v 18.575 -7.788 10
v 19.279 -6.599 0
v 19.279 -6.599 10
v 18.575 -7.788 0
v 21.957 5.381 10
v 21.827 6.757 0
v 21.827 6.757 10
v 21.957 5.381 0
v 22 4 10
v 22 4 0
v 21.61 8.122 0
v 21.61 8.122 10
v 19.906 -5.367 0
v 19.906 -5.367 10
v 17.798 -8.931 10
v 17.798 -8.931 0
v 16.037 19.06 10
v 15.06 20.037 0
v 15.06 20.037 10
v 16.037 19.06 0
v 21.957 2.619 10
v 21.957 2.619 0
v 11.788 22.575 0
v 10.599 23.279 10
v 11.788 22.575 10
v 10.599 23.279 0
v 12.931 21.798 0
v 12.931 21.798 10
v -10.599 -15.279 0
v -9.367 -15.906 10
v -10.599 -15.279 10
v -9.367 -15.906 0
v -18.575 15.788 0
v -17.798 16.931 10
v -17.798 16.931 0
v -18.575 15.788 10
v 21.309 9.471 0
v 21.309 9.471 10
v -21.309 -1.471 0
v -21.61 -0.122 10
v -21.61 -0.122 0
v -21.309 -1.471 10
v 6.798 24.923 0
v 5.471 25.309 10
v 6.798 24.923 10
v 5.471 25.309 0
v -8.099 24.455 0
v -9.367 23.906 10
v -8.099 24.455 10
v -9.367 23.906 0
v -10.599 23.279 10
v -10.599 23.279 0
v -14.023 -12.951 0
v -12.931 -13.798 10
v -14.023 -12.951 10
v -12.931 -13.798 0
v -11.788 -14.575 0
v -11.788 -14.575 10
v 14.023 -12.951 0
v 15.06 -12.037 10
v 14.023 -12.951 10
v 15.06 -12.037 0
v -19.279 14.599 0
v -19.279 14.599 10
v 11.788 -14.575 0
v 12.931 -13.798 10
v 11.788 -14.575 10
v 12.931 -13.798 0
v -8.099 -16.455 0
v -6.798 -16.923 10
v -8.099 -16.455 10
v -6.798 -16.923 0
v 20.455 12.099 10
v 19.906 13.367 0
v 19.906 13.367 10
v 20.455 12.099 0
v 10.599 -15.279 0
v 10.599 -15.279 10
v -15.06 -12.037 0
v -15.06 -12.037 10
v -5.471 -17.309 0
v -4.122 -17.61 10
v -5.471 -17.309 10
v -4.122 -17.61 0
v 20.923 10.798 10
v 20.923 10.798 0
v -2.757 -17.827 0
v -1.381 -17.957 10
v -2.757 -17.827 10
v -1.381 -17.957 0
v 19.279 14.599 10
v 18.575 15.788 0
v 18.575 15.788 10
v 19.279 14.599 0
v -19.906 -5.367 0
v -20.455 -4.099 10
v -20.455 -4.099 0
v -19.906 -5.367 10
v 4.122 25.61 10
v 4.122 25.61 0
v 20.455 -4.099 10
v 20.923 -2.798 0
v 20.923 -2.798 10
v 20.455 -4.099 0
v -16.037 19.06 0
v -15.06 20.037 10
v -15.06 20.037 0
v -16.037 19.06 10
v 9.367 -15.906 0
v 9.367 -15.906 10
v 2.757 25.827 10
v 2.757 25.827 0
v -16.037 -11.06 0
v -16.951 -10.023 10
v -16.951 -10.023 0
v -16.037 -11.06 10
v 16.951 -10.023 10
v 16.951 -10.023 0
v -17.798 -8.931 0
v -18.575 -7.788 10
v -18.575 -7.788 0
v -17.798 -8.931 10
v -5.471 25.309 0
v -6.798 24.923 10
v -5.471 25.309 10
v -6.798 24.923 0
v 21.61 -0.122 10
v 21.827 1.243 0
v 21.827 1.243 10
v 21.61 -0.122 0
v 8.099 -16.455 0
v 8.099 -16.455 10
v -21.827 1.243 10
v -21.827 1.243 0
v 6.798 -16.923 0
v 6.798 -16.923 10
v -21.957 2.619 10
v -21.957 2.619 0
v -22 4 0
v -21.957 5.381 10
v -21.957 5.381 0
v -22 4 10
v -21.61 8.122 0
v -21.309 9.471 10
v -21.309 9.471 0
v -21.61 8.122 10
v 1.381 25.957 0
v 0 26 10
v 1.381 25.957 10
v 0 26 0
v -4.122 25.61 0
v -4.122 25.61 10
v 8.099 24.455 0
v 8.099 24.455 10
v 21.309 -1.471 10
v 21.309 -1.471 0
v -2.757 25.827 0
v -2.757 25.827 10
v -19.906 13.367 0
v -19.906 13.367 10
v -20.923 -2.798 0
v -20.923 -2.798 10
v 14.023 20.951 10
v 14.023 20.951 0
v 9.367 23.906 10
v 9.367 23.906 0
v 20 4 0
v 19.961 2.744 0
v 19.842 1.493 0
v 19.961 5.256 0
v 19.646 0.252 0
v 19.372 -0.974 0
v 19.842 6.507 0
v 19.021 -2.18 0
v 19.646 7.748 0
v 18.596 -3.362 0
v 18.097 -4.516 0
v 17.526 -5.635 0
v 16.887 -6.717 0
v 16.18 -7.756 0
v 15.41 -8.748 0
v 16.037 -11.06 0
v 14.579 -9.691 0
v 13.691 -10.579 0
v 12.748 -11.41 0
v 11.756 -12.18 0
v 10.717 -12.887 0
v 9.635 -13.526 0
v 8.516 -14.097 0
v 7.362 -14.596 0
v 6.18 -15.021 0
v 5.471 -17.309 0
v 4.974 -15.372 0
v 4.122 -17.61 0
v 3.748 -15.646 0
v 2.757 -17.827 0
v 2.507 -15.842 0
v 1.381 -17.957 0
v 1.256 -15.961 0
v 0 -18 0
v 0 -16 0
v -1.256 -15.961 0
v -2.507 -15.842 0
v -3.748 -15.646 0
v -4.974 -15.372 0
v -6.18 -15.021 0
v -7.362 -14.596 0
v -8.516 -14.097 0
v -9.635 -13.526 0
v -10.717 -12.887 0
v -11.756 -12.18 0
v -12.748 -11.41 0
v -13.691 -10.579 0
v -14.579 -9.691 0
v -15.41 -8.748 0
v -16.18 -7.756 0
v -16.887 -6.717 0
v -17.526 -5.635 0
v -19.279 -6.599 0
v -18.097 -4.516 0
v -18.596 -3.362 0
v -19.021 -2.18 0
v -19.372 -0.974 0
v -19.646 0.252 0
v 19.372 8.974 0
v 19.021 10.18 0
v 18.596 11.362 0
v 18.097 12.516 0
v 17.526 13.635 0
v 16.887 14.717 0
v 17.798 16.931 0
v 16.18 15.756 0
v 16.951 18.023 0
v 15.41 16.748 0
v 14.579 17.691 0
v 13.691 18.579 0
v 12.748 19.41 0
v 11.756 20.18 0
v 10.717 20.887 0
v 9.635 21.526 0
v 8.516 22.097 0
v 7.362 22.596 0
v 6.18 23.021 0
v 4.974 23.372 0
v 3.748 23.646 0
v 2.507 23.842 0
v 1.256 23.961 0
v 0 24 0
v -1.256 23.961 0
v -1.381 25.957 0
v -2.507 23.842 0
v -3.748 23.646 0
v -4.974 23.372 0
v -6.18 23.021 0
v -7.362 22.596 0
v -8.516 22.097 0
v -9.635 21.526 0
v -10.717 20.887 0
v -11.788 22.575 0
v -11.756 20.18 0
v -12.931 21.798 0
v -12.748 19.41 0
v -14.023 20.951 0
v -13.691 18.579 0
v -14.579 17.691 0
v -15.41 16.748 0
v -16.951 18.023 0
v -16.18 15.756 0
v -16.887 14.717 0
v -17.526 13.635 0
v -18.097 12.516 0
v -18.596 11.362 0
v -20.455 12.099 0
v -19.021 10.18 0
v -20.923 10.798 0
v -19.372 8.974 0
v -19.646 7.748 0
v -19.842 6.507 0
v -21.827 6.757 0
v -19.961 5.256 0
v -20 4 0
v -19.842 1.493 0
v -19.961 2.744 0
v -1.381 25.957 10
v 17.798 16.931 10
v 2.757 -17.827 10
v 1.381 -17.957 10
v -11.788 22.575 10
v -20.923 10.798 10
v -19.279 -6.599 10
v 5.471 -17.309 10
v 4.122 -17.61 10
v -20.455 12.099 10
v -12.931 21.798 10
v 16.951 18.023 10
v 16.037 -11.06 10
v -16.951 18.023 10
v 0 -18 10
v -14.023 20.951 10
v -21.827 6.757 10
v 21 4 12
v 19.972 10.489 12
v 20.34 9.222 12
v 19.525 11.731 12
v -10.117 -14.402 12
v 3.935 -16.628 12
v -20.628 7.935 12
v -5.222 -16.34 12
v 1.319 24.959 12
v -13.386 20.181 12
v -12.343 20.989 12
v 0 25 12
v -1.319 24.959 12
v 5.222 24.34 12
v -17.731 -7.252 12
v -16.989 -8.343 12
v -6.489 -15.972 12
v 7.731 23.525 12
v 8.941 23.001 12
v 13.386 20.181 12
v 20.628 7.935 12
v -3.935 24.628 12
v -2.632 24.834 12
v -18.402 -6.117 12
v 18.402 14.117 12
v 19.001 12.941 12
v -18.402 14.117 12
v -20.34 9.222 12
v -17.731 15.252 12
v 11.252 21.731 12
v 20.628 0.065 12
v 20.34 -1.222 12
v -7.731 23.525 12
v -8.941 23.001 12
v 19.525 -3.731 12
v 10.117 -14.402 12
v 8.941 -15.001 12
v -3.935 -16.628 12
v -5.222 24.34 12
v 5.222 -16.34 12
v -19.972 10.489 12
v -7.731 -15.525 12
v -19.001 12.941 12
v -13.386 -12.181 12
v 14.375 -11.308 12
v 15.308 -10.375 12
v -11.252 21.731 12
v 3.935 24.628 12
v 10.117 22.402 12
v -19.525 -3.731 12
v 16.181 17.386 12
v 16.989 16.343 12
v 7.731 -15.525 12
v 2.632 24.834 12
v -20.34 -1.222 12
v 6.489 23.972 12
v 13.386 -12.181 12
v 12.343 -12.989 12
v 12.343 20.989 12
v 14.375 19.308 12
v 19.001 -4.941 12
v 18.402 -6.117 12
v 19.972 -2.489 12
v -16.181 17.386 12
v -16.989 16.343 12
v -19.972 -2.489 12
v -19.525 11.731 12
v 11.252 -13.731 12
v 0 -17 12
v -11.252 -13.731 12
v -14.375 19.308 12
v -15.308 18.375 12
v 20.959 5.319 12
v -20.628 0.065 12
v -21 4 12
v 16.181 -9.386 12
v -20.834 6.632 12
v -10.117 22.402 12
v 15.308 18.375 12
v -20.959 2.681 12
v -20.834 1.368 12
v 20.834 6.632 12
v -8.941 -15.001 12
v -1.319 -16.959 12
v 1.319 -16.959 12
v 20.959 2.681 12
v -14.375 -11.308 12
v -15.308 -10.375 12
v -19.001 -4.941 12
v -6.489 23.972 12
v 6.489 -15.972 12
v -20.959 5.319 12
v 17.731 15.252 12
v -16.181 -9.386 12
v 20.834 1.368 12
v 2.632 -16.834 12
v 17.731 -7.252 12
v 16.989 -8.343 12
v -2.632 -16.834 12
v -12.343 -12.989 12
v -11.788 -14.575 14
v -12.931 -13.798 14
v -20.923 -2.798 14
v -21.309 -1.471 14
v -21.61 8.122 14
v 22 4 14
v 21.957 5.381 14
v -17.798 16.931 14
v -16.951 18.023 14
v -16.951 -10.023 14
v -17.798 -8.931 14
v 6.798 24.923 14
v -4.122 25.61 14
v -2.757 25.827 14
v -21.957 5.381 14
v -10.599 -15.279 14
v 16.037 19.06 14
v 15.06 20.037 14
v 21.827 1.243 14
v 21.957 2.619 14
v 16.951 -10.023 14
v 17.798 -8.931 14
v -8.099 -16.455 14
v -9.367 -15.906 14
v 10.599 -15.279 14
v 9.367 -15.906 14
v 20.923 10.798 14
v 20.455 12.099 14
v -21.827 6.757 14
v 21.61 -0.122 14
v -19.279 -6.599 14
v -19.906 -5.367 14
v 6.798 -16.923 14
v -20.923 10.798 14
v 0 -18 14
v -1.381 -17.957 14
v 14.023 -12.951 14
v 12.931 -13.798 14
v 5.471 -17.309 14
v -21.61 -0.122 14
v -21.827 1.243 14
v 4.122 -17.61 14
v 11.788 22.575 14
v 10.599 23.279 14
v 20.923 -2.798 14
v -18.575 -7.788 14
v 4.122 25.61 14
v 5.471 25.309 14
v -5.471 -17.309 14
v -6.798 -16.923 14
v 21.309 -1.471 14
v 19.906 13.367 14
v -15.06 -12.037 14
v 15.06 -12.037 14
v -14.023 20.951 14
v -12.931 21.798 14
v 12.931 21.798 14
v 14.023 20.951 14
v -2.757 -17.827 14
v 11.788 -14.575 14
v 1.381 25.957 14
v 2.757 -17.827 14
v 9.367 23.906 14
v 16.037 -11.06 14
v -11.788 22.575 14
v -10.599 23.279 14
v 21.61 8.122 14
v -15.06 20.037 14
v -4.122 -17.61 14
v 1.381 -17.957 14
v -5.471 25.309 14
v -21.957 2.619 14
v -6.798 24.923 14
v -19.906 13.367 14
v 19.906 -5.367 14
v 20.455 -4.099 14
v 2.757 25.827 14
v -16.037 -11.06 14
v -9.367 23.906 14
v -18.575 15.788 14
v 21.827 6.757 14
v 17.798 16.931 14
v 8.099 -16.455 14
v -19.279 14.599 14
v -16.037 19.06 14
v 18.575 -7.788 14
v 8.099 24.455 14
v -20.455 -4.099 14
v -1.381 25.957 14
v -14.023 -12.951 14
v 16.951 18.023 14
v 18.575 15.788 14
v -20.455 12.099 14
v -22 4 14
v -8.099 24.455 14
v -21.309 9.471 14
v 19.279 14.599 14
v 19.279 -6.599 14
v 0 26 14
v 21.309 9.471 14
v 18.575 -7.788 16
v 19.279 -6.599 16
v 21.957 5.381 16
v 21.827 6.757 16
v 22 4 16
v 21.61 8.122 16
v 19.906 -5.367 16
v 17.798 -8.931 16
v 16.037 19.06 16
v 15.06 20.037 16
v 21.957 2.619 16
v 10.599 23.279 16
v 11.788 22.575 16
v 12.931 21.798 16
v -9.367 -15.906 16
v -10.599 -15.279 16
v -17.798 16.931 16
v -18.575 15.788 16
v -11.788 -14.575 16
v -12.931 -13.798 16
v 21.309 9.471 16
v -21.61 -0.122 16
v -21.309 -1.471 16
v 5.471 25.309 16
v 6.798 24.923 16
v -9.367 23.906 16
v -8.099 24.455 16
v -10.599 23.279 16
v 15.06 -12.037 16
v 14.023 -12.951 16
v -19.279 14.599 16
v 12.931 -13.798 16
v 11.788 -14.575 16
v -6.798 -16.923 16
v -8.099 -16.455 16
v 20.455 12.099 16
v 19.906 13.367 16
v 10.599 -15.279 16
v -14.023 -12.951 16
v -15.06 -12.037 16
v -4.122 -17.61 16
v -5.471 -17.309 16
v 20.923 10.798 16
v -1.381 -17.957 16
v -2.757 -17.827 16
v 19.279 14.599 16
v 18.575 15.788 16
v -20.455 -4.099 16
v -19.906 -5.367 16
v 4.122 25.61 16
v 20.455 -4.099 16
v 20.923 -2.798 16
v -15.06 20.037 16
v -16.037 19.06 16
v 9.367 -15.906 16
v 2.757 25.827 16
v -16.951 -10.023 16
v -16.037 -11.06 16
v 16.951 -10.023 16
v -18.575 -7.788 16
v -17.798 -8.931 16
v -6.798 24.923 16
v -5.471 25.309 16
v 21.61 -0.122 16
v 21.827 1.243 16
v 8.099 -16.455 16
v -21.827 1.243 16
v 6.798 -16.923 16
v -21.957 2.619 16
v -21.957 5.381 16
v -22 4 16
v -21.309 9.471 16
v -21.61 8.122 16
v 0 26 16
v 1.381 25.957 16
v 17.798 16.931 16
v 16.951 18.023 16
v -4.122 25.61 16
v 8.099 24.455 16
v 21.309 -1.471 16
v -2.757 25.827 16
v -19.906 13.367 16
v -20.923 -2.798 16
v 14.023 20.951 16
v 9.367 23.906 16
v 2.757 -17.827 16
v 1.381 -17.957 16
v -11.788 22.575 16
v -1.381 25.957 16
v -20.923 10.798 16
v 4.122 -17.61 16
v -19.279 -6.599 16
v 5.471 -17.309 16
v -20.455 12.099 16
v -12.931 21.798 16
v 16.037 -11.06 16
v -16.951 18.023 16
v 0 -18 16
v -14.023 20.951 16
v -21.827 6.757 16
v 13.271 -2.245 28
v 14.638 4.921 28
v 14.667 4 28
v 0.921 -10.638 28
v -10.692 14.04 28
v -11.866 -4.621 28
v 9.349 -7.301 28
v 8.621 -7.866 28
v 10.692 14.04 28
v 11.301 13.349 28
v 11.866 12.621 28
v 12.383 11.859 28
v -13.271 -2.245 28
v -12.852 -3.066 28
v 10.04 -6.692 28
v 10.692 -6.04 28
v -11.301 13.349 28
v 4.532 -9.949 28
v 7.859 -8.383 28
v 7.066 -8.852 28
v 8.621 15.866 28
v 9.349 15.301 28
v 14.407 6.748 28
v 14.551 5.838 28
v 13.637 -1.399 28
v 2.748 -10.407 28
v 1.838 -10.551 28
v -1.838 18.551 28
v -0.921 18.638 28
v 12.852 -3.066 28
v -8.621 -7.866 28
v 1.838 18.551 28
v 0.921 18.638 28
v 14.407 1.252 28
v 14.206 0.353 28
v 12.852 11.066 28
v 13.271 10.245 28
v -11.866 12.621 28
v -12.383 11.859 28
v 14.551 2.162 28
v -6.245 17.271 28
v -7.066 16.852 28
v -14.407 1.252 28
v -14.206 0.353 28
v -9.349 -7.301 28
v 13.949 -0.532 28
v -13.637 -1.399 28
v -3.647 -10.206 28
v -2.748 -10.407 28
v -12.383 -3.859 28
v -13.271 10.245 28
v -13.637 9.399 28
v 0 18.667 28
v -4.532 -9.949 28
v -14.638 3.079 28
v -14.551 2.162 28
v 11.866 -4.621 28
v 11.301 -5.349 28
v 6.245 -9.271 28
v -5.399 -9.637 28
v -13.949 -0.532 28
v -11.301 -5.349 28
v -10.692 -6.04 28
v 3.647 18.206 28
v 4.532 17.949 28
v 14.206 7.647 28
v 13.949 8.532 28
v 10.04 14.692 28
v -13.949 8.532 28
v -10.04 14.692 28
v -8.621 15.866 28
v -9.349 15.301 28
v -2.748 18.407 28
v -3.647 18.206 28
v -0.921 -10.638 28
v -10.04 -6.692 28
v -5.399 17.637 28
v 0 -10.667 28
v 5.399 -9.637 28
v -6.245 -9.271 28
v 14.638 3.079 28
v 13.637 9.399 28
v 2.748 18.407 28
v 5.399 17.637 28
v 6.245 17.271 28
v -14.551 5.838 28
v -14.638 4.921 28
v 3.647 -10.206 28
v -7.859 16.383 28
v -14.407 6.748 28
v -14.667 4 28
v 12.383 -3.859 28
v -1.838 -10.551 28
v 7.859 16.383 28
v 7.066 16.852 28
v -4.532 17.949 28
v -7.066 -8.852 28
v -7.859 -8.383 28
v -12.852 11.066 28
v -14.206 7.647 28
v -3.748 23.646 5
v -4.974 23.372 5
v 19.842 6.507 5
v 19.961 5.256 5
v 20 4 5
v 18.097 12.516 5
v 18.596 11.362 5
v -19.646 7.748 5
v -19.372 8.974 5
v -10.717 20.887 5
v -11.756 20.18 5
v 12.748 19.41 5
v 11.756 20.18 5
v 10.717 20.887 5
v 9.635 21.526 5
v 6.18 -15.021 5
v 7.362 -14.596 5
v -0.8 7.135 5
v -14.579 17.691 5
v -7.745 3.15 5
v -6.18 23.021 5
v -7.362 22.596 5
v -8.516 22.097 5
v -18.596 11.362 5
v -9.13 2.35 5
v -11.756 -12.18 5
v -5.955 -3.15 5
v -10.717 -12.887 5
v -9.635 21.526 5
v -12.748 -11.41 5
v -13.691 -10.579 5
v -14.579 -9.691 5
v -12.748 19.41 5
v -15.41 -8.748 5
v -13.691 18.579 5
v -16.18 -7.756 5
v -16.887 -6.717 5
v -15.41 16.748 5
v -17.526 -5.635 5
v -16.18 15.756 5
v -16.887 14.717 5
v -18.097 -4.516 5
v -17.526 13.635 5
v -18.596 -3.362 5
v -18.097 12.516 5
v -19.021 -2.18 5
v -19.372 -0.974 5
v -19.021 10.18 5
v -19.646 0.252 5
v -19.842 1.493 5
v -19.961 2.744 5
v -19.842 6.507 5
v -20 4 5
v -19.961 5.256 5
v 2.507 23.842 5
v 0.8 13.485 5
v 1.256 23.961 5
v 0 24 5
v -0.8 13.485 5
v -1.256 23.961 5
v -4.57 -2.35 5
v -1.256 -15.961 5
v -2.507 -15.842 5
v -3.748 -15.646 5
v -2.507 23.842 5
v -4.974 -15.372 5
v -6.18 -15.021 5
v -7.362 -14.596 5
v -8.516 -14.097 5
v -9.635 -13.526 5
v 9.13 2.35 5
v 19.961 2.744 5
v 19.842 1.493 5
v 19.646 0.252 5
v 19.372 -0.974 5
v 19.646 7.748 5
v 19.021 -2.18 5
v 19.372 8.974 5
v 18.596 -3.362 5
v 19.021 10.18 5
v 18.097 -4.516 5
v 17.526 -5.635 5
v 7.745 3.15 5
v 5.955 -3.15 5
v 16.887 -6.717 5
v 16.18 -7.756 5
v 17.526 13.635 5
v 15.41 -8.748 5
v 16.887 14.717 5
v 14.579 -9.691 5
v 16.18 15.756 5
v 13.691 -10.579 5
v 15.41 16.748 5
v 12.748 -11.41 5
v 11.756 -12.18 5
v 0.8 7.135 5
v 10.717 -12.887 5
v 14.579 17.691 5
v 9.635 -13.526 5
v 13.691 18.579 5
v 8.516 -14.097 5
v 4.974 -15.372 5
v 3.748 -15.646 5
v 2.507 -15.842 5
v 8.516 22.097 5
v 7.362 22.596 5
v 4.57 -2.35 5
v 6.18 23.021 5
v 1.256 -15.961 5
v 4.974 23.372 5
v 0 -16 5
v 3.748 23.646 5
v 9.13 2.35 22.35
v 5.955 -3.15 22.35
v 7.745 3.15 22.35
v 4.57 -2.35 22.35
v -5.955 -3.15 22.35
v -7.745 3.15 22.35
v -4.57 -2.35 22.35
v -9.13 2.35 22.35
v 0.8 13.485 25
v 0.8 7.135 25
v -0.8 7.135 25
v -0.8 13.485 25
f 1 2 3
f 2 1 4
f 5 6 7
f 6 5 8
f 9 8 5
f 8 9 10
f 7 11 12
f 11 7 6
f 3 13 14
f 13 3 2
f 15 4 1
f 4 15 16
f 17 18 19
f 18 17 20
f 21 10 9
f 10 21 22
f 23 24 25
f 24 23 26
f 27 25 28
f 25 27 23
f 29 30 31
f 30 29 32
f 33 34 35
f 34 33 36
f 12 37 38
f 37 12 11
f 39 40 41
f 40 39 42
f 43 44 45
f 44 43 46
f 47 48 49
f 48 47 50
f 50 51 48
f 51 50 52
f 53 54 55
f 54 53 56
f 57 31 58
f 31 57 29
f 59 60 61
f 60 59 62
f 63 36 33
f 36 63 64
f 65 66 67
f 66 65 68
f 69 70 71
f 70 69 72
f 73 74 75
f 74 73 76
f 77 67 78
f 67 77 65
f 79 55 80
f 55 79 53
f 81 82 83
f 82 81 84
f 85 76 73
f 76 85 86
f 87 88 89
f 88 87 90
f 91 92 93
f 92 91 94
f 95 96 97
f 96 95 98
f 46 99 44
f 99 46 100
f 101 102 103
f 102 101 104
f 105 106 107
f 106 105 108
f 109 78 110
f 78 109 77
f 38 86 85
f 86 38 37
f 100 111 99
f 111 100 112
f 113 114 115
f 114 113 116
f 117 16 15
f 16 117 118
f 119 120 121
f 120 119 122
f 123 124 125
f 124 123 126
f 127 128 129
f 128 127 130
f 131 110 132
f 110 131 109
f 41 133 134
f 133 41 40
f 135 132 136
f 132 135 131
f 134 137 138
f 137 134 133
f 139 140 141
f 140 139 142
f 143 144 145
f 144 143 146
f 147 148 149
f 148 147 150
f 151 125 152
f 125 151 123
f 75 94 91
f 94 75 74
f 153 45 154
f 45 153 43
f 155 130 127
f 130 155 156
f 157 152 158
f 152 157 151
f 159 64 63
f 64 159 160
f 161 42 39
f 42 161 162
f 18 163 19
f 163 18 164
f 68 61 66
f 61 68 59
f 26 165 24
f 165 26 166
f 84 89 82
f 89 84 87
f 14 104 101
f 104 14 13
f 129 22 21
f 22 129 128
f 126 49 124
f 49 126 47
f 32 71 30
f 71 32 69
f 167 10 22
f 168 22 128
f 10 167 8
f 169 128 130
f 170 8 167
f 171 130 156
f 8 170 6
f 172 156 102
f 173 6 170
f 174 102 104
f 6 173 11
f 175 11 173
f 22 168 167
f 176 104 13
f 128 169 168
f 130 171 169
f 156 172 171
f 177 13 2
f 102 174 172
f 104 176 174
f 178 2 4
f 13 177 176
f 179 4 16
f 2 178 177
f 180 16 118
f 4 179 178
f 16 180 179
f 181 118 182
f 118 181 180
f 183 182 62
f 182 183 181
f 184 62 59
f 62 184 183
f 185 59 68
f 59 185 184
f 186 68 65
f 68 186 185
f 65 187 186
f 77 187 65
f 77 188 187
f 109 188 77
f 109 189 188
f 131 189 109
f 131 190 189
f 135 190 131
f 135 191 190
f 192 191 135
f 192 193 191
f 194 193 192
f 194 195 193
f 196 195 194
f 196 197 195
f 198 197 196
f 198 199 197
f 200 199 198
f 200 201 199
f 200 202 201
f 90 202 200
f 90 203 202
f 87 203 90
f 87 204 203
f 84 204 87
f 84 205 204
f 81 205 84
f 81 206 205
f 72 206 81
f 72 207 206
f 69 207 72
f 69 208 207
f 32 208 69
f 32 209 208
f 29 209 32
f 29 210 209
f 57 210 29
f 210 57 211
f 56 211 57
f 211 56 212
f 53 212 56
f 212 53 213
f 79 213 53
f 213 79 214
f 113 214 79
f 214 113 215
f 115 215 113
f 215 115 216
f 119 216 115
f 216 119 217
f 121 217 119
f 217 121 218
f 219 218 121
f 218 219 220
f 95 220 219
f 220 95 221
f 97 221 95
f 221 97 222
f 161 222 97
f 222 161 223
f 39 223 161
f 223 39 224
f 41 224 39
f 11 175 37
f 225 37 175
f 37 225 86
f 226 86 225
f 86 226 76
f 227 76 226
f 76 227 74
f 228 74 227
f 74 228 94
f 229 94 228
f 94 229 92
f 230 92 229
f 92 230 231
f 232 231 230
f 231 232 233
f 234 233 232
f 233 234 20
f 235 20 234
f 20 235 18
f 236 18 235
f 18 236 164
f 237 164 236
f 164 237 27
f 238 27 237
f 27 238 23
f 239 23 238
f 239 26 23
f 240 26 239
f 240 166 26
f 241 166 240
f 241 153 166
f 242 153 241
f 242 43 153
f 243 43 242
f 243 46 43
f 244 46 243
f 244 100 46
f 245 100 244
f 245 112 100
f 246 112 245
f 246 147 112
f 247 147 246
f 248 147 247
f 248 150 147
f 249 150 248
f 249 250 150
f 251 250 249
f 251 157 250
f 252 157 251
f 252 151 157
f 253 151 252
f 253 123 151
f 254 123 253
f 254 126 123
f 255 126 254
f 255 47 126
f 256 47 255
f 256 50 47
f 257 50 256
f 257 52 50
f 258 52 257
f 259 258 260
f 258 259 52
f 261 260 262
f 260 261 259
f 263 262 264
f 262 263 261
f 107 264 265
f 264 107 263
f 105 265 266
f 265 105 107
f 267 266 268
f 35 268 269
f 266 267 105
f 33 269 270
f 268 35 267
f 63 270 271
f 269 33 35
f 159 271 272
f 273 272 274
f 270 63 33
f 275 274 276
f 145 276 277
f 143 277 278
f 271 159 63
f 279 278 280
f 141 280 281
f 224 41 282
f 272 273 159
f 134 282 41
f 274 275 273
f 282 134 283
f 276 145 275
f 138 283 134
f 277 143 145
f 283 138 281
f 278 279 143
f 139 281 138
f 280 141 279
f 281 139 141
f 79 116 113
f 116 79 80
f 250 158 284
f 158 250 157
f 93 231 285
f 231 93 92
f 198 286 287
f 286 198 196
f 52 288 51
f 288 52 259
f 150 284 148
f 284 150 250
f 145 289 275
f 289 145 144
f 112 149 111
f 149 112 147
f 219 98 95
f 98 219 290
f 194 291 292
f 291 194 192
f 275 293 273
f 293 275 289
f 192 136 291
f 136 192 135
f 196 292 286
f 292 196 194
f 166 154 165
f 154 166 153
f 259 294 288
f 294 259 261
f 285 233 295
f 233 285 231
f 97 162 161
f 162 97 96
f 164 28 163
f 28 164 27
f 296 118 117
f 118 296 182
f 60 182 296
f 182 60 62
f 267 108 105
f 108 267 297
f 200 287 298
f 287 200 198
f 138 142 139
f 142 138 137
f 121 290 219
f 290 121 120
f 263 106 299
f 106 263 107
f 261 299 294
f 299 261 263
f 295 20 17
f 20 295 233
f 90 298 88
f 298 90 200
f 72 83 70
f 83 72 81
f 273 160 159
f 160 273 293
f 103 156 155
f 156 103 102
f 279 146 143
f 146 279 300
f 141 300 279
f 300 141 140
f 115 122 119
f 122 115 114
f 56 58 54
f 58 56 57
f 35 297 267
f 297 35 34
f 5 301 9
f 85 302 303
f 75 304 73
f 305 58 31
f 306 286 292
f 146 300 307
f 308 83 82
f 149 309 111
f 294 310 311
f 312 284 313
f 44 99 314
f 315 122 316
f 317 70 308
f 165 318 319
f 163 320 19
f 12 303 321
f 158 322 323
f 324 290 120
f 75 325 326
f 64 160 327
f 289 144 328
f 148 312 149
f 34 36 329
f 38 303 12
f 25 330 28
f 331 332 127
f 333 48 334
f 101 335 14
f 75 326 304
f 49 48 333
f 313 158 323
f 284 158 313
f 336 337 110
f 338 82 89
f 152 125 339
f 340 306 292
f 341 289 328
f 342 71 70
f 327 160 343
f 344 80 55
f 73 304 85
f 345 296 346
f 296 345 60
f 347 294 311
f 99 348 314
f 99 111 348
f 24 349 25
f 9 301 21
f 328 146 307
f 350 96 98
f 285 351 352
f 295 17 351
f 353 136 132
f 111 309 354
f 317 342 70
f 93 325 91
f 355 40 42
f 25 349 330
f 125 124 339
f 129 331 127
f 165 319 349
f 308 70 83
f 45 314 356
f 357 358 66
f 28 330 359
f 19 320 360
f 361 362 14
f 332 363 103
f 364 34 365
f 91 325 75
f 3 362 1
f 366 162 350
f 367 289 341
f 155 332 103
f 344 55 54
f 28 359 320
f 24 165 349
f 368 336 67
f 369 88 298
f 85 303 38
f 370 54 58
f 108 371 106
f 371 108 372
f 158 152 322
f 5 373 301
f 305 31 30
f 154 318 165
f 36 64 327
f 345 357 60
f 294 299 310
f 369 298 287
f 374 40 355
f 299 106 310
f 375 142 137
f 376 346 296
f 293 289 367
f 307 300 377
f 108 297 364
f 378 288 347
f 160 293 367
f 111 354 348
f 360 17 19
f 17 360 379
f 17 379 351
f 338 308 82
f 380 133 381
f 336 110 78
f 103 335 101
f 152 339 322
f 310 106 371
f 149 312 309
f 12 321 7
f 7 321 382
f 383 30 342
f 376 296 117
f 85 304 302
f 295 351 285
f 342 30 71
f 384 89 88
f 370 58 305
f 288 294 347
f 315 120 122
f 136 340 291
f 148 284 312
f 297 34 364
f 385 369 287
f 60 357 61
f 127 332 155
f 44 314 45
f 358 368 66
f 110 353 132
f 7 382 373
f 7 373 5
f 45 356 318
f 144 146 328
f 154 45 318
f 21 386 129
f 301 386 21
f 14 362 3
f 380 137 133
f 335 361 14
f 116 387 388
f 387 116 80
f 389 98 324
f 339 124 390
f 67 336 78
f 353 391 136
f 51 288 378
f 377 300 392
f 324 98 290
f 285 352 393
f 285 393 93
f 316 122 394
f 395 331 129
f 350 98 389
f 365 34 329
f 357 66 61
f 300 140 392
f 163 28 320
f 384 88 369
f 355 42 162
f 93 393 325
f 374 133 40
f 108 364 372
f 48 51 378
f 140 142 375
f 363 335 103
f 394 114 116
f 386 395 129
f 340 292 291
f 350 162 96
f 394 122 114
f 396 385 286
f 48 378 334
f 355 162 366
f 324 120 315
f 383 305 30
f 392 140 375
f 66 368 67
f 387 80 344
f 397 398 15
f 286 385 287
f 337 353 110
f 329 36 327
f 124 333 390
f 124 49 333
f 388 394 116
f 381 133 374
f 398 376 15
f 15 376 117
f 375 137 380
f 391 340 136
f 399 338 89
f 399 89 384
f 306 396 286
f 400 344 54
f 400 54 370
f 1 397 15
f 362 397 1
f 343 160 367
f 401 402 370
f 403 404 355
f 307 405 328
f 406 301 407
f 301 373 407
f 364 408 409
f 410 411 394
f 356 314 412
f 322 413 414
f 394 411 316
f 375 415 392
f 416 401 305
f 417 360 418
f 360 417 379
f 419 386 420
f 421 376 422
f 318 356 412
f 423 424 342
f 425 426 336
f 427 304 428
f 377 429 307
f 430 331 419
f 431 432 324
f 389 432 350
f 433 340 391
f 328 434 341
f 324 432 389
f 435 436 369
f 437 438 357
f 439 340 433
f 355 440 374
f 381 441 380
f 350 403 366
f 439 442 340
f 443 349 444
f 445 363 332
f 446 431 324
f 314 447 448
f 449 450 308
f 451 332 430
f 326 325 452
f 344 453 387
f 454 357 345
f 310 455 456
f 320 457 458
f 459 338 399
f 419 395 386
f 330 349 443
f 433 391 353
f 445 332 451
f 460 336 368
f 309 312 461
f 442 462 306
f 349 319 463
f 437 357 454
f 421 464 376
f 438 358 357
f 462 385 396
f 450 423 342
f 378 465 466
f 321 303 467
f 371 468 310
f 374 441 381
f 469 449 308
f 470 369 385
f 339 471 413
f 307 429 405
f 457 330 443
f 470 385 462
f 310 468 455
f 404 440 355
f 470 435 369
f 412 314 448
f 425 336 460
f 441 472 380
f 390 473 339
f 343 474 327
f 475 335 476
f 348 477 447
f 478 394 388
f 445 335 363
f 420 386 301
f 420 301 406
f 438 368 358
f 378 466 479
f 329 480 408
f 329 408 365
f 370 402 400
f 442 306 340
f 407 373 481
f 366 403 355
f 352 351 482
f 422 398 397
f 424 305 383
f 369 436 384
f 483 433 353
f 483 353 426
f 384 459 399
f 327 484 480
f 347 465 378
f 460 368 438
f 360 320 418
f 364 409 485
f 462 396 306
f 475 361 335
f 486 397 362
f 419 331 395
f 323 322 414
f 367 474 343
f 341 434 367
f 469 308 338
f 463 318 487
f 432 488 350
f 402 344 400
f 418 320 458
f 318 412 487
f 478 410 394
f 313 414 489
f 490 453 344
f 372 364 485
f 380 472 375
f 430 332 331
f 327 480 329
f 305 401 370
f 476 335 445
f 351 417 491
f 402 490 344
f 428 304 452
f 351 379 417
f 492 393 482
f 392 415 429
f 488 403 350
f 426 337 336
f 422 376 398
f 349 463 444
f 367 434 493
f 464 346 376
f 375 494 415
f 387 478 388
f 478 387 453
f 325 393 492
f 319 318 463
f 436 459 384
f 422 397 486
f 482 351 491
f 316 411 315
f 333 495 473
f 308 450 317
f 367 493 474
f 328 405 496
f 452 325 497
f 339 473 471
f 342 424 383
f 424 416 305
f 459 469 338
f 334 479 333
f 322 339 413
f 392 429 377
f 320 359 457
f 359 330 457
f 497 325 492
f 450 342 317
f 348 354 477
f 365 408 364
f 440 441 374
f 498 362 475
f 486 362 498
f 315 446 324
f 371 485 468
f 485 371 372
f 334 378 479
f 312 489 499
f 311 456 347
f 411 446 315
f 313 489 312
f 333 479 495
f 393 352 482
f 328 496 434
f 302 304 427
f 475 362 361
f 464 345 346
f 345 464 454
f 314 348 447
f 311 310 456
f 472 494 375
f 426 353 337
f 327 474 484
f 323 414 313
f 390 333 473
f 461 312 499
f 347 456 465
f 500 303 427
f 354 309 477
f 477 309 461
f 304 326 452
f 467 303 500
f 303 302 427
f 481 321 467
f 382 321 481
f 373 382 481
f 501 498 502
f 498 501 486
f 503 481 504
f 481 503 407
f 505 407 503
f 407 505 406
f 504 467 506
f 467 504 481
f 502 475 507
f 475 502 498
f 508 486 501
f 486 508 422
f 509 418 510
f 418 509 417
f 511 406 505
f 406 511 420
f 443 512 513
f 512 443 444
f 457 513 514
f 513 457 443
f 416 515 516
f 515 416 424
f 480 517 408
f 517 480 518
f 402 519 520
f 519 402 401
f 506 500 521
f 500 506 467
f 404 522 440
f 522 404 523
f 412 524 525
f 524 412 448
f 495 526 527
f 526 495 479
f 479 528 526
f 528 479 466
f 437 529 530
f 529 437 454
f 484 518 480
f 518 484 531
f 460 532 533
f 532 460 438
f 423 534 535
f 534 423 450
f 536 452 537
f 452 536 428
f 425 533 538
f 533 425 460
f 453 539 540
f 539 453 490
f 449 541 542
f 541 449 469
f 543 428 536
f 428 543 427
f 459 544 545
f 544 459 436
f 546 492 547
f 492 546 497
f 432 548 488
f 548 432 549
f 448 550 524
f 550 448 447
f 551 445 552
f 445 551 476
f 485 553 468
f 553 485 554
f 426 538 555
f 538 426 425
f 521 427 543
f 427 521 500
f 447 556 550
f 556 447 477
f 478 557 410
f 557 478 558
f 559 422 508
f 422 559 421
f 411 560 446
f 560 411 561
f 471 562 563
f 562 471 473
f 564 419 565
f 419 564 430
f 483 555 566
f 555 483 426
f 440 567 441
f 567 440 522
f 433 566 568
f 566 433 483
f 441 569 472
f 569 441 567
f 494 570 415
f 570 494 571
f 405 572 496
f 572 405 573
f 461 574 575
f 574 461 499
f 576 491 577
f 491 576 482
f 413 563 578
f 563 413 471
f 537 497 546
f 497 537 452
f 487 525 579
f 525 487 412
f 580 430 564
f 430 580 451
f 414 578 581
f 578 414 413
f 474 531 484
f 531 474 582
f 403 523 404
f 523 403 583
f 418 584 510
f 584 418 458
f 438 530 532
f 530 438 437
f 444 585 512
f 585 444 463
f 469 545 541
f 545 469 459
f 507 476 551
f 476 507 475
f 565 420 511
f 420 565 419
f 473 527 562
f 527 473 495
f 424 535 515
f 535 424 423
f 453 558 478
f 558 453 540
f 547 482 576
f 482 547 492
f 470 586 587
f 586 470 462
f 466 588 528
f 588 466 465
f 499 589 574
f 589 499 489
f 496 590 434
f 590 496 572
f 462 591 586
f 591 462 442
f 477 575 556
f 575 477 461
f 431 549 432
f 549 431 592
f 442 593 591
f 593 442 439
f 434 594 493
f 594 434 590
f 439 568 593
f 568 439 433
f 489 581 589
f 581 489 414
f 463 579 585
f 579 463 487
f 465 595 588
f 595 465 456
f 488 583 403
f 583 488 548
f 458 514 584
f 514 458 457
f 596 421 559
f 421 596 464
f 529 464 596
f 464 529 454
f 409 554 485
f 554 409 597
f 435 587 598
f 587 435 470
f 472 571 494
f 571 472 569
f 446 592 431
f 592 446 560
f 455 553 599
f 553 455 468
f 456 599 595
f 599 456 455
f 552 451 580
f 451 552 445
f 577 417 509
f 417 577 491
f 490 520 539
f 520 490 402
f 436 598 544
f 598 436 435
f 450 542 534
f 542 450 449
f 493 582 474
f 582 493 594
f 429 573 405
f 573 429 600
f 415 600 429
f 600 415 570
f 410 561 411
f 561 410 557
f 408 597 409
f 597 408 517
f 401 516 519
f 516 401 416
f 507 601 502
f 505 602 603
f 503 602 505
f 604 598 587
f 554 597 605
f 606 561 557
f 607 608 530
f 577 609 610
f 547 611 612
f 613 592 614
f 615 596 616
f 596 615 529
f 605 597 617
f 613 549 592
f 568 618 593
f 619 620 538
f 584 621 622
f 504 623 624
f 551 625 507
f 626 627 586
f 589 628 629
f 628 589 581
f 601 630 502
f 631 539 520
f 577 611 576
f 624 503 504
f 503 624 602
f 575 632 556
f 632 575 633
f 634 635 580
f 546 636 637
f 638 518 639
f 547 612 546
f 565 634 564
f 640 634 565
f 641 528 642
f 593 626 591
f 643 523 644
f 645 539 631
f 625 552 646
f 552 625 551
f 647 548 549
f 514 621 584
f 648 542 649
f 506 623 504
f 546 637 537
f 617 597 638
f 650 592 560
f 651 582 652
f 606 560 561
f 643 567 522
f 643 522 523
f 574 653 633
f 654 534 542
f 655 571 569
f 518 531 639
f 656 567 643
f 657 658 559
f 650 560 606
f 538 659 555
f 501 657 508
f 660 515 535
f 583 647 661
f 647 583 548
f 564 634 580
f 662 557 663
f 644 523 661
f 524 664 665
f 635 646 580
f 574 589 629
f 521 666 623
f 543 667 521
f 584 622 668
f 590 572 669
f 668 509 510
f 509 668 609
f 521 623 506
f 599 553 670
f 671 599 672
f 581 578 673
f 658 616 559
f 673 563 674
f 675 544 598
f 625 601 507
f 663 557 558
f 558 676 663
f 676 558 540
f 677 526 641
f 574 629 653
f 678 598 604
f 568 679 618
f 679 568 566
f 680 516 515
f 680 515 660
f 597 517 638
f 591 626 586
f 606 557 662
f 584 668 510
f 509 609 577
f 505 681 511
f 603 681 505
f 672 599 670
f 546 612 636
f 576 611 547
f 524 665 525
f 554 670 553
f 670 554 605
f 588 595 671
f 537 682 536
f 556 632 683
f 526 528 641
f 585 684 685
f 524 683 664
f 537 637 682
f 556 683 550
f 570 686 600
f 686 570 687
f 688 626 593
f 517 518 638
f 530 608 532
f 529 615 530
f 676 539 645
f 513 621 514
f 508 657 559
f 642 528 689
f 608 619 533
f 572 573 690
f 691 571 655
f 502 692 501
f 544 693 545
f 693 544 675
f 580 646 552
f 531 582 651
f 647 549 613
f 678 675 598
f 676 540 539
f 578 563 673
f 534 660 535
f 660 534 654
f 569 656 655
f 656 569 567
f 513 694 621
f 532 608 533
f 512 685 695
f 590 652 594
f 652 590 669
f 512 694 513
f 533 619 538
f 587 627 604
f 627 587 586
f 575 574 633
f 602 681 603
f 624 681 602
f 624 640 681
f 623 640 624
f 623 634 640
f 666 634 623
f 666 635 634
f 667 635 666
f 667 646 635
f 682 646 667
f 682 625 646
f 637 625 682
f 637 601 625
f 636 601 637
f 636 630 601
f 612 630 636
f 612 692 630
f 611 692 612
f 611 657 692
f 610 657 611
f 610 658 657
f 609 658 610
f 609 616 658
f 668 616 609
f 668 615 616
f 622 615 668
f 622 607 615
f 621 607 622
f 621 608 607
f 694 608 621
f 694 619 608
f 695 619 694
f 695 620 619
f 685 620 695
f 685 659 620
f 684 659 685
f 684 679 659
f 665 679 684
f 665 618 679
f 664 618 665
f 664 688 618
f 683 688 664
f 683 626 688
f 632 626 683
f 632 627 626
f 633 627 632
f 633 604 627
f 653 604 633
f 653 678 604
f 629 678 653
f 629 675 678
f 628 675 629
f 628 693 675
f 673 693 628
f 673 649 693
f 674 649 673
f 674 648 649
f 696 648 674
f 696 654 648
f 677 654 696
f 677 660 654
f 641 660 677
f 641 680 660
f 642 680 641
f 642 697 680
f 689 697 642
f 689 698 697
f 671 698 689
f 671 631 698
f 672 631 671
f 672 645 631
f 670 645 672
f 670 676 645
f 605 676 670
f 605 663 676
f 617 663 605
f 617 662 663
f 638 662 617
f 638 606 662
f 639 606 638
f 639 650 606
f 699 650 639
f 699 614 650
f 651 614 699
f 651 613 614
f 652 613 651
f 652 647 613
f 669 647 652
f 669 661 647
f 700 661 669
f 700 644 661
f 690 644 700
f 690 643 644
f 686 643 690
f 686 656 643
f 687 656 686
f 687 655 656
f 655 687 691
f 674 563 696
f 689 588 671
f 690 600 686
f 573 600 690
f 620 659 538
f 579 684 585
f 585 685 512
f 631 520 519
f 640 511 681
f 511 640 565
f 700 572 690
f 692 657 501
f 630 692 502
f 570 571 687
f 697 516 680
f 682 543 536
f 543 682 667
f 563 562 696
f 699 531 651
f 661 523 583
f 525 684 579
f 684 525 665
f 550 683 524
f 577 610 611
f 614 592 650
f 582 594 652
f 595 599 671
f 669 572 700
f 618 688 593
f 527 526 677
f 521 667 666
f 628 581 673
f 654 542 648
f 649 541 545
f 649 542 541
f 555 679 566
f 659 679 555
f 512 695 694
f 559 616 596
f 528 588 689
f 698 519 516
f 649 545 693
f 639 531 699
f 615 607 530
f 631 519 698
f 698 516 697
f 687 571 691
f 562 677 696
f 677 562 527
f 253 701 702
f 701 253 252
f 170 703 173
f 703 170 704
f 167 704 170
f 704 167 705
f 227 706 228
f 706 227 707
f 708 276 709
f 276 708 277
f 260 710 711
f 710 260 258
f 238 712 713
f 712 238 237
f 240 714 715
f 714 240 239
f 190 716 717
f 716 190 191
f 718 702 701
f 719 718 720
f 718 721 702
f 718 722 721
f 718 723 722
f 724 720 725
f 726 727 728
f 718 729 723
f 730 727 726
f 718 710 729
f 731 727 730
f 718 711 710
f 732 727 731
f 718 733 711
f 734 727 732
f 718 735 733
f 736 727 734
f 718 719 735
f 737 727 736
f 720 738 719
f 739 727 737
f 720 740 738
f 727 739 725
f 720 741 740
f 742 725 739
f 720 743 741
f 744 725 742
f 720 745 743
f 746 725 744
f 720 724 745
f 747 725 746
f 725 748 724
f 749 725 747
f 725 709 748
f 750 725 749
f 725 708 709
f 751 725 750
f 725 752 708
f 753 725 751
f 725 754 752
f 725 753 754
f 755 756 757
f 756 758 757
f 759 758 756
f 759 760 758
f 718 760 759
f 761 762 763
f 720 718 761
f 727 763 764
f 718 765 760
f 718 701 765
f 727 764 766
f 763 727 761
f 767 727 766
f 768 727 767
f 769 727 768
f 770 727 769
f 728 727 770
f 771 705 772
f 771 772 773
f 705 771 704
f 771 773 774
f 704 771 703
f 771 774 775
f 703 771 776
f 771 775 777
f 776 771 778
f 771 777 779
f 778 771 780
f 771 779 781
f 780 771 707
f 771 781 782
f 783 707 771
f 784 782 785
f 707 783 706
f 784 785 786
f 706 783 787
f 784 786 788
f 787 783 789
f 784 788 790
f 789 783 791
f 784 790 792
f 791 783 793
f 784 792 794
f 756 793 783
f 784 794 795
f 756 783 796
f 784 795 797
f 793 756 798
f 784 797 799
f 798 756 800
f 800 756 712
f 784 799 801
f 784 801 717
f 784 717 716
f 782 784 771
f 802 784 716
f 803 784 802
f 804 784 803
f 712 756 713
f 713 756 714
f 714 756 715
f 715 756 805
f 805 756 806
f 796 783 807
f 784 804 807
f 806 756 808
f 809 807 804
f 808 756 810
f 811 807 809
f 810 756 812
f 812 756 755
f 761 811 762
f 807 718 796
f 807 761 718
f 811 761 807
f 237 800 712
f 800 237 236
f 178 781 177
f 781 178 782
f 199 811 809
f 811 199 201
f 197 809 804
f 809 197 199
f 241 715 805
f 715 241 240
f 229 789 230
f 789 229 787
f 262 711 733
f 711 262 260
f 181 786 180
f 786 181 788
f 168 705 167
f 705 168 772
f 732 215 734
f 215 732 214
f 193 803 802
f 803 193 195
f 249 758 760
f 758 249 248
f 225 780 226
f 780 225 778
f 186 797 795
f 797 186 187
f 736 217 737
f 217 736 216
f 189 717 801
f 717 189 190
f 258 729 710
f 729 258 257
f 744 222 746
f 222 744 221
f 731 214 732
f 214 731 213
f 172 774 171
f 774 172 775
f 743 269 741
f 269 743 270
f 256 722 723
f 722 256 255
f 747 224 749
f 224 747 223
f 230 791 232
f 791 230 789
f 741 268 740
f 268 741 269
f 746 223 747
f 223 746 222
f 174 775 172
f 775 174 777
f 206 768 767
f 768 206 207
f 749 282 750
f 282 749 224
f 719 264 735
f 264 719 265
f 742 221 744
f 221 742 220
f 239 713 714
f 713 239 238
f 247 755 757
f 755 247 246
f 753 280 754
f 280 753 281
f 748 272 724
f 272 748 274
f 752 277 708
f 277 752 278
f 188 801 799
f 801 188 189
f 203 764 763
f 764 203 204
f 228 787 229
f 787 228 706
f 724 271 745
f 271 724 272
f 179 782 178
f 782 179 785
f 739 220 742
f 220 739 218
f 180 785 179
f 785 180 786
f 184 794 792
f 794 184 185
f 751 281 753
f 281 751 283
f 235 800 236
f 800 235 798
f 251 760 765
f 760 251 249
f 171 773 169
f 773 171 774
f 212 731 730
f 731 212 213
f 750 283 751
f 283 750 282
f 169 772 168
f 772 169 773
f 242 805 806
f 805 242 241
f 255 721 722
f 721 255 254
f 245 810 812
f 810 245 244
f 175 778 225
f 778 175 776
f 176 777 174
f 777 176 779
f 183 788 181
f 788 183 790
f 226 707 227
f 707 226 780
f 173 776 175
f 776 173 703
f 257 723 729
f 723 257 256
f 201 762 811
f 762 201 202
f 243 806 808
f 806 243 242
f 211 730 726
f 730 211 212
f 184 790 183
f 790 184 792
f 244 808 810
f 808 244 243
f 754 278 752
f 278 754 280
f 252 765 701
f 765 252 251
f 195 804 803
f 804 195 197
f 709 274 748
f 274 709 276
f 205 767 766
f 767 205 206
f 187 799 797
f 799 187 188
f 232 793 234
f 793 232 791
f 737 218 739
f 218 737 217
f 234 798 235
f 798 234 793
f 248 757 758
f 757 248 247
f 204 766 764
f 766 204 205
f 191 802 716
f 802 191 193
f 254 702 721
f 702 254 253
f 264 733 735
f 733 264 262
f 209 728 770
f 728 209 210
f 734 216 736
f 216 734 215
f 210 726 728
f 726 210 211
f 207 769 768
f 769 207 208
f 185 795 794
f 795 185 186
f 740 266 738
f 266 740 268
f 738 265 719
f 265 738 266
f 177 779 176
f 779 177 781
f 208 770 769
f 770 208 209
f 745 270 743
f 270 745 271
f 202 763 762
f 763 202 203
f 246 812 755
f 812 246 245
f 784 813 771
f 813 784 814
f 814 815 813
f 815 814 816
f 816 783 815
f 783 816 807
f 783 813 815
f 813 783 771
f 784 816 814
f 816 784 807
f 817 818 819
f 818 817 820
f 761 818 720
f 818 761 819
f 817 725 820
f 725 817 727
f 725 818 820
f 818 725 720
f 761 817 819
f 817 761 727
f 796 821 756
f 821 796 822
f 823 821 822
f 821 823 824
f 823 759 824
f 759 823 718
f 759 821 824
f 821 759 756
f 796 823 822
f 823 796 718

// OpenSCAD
blade_width = 6.35;
blade_thick = 1.6;
blade_length = 17.35;
blade_space = 13.7;
blade_angle = 30;

earth_width = 6.35;
earth_thick = 1.6;
earth_length = 20;
earth_space = 10.31;

outer_diameter = 40;
outer_offset = 4;
outer_thick = 5;

outside_diameter = outer_diameter + 4;
outside_height = max(blade_length, earth_length)+outer_thick+3;

groove = 2;

$fn=100;

difference() {
    union() {
        translate([0,outer_offset,0]) cylinder(d=outside_diameter, h=outside_height/2-groove*2);
        translate([0,outer_offset,outside_height/2-groove*2]) cylinder(d1=outside_diameter, d2=outside_diameter-groove,h=groove);
        translate([0,outer_offset,outside_height/2-groove]) cylinder(d1=outside_diameter-groove, d2=outside_diameter,h=groove);
        translate([0,outer_offset,outside_height/2]) cylinder(d=outside_diameter,h=groove);
        translate([0,outer_offset,outside_height/2+groove]) cylinder(d1=outside_diameter,d2=outside_diameter*2/3,h=outside_height/2-groove);
    }
    translate([0,outer_offset,0]) cylinder(d=outer_diameter, h=outer_thick);
    
    translate([blade_space/2,0,blade_length/2+outer_thick]) rotate([0,0,-blade_angle]) cube([blade_thick,blade_width,blade_length], center=true);
    translate([-blade_space/2,0,blade_length/2+outer_thick]) rotate([0,0,blade_angle]) cube([blade_thick,blade_width,blade_length], center=true);
    translate([0,earth_space,earth_length/2+outer_thick]) cube([earth_thick, earth_width, earth_length], center=true);
}
